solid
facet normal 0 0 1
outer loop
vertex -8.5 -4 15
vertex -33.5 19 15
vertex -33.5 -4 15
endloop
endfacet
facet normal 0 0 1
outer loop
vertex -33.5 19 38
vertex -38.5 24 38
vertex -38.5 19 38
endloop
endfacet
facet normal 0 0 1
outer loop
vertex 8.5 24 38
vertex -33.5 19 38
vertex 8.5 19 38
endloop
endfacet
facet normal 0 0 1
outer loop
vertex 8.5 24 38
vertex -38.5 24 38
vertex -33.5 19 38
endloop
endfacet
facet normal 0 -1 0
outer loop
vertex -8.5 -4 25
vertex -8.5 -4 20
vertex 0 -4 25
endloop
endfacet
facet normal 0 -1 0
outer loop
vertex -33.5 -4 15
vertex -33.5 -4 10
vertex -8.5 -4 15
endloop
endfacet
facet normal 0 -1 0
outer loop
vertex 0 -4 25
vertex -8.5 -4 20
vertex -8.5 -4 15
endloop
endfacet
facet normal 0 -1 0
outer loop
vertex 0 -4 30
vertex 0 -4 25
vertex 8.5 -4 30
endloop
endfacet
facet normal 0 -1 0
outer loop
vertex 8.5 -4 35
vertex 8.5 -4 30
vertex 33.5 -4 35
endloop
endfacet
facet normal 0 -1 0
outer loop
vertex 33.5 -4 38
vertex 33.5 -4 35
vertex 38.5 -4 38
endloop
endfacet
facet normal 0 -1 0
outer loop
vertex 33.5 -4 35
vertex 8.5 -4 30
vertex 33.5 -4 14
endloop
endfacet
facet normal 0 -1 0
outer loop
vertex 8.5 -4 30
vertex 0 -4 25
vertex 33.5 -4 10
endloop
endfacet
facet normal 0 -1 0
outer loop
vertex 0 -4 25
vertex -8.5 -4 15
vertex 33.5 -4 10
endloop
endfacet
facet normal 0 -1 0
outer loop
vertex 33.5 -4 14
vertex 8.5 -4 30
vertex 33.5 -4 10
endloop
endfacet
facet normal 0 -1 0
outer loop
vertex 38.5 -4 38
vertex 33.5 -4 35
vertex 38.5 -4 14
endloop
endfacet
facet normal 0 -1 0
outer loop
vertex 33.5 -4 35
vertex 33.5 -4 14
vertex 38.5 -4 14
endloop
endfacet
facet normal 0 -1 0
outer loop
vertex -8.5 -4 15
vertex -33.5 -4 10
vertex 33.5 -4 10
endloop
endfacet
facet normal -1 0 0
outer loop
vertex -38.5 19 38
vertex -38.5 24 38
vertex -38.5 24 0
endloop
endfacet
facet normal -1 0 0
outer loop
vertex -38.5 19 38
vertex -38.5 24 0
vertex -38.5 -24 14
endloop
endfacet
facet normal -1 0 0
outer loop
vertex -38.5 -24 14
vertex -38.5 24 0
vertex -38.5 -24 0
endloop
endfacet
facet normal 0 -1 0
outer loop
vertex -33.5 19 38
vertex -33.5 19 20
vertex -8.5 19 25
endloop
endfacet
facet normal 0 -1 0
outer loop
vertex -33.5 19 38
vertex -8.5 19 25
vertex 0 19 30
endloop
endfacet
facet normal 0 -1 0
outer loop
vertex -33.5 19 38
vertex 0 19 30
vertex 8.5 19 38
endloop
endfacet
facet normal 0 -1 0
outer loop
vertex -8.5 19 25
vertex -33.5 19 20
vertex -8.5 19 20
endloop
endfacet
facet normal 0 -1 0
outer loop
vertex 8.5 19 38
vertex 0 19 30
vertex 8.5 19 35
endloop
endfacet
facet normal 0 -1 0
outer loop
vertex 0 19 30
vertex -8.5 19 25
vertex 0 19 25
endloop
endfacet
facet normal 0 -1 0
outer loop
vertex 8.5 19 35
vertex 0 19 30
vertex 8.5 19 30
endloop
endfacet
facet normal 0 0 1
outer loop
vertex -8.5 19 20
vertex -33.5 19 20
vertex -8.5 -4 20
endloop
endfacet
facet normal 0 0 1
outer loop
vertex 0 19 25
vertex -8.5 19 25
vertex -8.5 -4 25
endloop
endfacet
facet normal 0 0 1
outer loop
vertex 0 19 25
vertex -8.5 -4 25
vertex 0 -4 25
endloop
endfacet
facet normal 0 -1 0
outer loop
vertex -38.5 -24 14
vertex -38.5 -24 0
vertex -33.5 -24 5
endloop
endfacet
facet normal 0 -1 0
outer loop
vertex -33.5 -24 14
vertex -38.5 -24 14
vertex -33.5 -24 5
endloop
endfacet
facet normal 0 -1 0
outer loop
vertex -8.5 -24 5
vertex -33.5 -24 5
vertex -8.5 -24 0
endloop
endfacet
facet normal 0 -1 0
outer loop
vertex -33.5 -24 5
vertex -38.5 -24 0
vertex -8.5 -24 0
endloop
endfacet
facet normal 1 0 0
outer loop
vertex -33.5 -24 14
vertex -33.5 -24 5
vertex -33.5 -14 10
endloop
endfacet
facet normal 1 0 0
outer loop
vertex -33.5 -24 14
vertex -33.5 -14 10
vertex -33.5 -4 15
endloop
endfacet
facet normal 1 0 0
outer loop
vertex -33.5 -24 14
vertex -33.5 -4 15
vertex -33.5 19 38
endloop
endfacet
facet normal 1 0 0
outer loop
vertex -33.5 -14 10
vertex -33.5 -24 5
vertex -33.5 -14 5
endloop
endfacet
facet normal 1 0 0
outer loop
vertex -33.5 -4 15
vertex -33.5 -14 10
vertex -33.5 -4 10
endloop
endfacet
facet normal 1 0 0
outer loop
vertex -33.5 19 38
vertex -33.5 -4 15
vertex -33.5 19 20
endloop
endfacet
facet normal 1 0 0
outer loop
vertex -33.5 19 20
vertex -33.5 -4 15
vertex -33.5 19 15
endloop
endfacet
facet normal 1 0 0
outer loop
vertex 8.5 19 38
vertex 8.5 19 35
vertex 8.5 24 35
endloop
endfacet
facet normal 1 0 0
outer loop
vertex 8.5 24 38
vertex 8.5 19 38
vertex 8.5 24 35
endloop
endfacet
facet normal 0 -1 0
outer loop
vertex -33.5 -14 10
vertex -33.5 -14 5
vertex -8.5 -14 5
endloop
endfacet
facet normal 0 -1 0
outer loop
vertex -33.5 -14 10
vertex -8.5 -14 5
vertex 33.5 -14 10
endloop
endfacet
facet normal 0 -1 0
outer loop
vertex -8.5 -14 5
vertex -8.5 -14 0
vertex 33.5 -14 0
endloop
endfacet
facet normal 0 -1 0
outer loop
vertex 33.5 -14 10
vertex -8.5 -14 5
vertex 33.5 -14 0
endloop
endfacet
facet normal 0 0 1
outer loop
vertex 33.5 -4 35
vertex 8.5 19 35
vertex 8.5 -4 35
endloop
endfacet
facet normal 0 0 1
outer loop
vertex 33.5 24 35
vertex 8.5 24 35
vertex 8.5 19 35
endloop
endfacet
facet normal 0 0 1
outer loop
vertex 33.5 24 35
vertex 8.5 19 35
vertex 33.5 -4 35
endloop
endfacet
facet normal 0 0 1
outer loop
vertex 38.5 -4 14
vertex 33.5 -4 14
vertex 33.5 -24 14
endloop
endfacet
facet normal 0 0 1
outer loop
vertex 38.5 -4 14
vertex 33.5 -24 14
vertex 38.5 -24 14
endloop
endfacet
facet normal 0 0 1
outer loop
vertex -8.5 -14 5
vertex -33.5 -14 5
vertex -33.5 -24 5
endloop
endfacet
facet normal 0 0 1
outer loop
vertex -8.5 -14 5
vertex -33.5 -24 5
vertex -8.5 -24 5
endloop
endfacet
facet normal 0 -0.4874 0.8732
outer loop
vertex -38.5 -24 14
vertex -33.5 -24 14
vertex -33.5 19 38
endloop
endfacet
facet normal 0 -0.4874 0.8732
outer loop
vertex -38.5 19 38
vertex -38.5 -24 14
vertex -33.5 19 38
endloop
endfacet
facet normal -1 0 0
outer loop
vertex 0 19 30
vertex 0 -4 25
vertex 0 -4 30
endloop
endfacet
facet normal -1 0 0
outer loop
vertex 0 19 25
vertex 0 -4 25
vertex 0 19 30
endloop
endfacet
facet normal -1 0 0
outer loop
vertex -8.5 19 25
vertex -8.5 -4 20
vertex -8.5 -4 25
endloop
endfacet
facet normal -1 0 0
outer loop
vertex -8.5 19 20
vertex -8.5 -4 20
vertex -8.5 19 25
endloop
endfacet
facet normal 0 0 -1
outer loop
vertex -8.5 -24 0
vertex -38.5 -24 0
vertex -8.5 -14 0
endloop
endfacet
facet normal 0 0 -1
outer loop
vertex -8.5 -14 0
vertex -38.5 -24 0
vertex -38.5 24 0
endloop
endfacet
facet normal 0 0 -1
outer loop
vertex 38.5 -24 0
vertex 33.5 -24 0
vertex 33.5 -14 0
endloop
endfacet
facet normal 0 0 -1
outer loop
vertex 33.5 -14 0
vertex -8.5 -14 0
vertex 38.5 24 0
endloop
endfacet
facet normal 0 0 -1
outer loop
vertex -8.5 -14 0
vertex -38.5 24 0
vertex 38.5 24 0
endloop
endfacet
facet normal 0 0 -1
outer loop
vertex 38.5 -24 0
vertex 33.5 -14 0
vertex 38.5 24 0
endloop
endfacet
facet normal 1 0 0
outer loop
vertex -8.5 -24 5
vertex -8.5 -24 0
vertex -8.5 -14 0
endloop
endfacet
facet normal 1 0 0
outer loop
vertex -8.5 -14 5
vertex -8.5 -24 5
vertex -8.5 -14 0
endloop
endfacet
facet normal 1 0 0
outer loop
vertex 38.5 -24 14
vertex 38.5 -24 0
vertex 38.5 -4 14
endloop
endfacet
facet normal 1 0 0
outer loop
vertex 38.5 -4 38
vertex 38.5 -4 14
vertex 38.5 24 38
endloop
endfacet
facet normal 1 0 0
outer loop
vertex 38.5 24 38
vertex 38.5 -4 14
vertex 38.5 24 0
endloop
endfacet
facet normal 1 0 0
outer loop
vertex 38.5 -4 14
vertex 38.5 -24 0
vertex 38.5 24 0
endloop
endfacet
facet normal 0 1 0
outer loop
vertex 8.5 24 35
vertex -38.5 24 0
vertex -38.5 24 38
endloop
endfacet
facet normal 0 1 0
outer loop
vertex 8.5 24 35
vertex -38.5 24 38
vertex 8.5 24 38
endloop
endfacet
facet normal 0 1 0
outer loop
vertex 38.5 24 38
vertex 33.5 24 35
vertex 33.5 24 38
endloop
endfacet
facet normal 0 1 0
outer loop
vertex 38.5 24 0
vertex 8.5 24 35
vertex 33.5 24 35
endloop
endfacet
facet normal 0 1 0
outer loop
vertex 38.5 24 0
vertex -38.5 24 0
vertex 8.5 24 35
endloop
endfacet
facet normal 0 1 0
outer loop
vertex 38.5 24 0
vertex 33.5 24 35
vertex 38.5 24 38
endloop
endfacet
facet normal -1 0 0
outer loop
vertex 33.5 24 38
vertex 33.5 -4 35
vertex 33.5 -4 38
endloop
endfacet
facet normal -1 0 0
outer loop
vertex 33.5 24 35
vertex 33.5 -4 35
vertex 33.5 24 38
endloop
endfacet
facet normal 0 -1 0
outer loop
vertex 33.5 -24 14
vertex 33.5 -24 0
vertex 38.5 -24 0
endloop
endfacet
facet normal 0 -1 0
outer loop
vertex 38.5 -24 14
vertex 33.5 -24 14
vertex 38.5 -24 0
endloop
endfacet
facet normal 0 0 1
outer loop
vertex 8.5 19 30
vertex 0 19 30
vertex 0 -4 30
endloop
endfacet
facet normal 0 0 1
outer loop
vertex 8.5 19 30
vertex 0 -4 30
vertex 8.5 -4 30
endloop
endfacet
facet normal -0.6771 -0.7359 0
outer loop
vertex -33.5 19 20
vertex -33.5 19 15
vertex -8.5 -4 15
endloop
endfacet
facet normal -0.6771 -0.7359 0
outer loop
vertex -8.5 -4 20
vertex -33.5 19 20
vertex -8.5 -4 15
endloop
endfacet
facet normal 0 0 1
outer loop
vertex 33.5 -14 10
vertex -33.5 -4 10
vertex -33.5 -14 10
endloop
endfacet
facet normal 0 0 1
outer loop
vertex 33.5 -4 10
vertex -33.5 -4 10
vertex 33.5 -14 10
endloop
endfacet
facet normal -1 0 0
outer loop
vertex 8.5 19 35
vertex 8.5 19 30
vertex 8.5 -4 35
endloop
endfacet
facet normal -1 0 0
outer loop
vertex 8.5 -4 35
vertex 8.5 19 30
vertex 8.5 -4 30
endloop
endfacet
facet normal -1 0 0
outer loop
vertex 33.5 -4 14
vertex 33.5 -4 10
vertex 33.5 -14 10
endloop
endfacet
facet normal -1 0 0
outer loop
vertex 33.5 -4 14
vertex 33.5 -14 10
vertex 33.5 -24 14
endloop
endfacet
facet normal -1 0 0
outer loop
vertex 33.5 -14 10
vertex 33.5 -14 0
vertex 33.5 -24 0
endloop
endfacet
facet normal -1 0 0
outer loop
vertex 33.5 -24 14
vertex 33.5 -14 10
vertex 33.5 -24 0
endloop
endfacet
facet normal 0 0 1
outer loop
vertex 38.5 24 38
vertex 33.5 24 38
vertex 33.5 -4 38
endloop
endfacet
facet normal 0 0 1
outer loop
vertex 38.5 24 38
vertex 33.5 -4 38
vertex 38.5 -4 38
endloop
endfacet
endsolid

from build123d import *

# Parameters (mm, degrees)
F1_DEPTH  = 38
F3_DEPTH  = 25
F4_DEPTH  = 38
F0_W      = 25
F0_H      = 10
F5_DEPTH  = 5
F6_DEPTH  = 10
F0_W_2    = 8.5
F0_H_2    = 23
F7_DEPTH  = 25
F8_DEPTH  = 30
F9_DEPTH  = 20
F10_DEPTH = 15
F11_DEPTH = 35
F0_W_3    = 5
F0_H_3    = 28
F12_DEPTH = 38
F13_DEPTH = 14


with BuildPart() as f1:
    # F0 (on Top) → F1 (new body)
    with BuildSketch(Plane.XY):
        Polygon((-33.5, 19), (-38.5, 19), (-38.5, -24), (-33.5, -24), (-33.5, -14), (-33.5, -4), align=None)
    extrude(amount=F1_DEPTH)

    # F2 (on face) → F3 (cut)
    with BuildSketch(Plane.YZ.offset(-33.5)):
        Polygon((-24, 38), (-24, 14), (19, 38), align=None)
    extrude(amount=-F3_DEPTH, mode=Mode.SUBTRACT)

    # F0 (on Top) → F4 (join)
    with BuildSketch(Plane.XY):
        Polygon((8.5, 19), (8.5, 24), (-38.5, 24), (-38.5, 19), (-33.5, 19), (-8.5, 19), (0, 19), align=None)
    extrude(amount=F4_DEPTH)

    # F0 (on Top) → F5 (join)
    with BuildSketch(Plane.XY):
        with Locations((-21, -19)):
            Rectangle(F0_W, F0_H)
    extrude(amount=F5_DEPTH)

    # F0 (on Top) → F6 (join)
    with BuildSketch(Plane.XY):
        Polygon((33.5, -14), (33.5, -4), (8.5, -4), (0, -4), (-8.5, -4), (-33.5, -4), (-33.5, -14), (-8.5, -14), align=None)
    extrude(amount=F6_DEPTH)

    # F0 (on Top) → F7 (join)
    with BuildSketch(Plane.XY):
        with Locations((-4.25, 7.5)):
            Rectangle(F0_W_2, F0_H_2)
    extrude(amount=F7_DEPTH)

    # F0 (on Top) → F8 (join)
    with BuildSketch(Plane.XY):
        with Locations((4.25, 7.5)):
            Rectangle(F0_W_2, F0_H_2)
    extrude(amount=F8_DEPTH)

    # F0 (on Top) → F9 (join)
    with BuildSketch(Plane.XY):
        Polygon((-8.5, 19), (-33.5, 19), (-8.5, -4), align=None)
    extrude(amount=F9_DEPTH)

    # F0 (on Top) → F10 (join)
    with BuildSketch(Plane.XY):
        Polygon((-8.5, -4), (-33.5, 19), (-33.5, -4), align=None)
    extrude(amount=F10_DEPTH)

    # F0 (on Top) → F11 (join)
    with BuildSketch(Plane.XY):
        Polygon((33.5, -4), (33.5, 24), (8.5, 24), (8.5, 19), (8.5, -4), align=None)
    extrude(amount=F11_DEPTH)

    # F0 (on Top) → F12 (join)
    with BuildSketch(Plane.XY):
        with Locations((36, 10)):
            Rectangle(F0_W_3, F0_H_3)
    extrude(amount=F12_DEPTH)

    # F0 (on Top) → F13 (join)
    with BuildSketch(Plane.XY):
        Polygon((38.5, -24), (38.5, -4), (33.5, -4), (33.5, -14), (33.5, -24), align=None)
    extrude(amount=F13_DEPTH)


solid = f1.part
